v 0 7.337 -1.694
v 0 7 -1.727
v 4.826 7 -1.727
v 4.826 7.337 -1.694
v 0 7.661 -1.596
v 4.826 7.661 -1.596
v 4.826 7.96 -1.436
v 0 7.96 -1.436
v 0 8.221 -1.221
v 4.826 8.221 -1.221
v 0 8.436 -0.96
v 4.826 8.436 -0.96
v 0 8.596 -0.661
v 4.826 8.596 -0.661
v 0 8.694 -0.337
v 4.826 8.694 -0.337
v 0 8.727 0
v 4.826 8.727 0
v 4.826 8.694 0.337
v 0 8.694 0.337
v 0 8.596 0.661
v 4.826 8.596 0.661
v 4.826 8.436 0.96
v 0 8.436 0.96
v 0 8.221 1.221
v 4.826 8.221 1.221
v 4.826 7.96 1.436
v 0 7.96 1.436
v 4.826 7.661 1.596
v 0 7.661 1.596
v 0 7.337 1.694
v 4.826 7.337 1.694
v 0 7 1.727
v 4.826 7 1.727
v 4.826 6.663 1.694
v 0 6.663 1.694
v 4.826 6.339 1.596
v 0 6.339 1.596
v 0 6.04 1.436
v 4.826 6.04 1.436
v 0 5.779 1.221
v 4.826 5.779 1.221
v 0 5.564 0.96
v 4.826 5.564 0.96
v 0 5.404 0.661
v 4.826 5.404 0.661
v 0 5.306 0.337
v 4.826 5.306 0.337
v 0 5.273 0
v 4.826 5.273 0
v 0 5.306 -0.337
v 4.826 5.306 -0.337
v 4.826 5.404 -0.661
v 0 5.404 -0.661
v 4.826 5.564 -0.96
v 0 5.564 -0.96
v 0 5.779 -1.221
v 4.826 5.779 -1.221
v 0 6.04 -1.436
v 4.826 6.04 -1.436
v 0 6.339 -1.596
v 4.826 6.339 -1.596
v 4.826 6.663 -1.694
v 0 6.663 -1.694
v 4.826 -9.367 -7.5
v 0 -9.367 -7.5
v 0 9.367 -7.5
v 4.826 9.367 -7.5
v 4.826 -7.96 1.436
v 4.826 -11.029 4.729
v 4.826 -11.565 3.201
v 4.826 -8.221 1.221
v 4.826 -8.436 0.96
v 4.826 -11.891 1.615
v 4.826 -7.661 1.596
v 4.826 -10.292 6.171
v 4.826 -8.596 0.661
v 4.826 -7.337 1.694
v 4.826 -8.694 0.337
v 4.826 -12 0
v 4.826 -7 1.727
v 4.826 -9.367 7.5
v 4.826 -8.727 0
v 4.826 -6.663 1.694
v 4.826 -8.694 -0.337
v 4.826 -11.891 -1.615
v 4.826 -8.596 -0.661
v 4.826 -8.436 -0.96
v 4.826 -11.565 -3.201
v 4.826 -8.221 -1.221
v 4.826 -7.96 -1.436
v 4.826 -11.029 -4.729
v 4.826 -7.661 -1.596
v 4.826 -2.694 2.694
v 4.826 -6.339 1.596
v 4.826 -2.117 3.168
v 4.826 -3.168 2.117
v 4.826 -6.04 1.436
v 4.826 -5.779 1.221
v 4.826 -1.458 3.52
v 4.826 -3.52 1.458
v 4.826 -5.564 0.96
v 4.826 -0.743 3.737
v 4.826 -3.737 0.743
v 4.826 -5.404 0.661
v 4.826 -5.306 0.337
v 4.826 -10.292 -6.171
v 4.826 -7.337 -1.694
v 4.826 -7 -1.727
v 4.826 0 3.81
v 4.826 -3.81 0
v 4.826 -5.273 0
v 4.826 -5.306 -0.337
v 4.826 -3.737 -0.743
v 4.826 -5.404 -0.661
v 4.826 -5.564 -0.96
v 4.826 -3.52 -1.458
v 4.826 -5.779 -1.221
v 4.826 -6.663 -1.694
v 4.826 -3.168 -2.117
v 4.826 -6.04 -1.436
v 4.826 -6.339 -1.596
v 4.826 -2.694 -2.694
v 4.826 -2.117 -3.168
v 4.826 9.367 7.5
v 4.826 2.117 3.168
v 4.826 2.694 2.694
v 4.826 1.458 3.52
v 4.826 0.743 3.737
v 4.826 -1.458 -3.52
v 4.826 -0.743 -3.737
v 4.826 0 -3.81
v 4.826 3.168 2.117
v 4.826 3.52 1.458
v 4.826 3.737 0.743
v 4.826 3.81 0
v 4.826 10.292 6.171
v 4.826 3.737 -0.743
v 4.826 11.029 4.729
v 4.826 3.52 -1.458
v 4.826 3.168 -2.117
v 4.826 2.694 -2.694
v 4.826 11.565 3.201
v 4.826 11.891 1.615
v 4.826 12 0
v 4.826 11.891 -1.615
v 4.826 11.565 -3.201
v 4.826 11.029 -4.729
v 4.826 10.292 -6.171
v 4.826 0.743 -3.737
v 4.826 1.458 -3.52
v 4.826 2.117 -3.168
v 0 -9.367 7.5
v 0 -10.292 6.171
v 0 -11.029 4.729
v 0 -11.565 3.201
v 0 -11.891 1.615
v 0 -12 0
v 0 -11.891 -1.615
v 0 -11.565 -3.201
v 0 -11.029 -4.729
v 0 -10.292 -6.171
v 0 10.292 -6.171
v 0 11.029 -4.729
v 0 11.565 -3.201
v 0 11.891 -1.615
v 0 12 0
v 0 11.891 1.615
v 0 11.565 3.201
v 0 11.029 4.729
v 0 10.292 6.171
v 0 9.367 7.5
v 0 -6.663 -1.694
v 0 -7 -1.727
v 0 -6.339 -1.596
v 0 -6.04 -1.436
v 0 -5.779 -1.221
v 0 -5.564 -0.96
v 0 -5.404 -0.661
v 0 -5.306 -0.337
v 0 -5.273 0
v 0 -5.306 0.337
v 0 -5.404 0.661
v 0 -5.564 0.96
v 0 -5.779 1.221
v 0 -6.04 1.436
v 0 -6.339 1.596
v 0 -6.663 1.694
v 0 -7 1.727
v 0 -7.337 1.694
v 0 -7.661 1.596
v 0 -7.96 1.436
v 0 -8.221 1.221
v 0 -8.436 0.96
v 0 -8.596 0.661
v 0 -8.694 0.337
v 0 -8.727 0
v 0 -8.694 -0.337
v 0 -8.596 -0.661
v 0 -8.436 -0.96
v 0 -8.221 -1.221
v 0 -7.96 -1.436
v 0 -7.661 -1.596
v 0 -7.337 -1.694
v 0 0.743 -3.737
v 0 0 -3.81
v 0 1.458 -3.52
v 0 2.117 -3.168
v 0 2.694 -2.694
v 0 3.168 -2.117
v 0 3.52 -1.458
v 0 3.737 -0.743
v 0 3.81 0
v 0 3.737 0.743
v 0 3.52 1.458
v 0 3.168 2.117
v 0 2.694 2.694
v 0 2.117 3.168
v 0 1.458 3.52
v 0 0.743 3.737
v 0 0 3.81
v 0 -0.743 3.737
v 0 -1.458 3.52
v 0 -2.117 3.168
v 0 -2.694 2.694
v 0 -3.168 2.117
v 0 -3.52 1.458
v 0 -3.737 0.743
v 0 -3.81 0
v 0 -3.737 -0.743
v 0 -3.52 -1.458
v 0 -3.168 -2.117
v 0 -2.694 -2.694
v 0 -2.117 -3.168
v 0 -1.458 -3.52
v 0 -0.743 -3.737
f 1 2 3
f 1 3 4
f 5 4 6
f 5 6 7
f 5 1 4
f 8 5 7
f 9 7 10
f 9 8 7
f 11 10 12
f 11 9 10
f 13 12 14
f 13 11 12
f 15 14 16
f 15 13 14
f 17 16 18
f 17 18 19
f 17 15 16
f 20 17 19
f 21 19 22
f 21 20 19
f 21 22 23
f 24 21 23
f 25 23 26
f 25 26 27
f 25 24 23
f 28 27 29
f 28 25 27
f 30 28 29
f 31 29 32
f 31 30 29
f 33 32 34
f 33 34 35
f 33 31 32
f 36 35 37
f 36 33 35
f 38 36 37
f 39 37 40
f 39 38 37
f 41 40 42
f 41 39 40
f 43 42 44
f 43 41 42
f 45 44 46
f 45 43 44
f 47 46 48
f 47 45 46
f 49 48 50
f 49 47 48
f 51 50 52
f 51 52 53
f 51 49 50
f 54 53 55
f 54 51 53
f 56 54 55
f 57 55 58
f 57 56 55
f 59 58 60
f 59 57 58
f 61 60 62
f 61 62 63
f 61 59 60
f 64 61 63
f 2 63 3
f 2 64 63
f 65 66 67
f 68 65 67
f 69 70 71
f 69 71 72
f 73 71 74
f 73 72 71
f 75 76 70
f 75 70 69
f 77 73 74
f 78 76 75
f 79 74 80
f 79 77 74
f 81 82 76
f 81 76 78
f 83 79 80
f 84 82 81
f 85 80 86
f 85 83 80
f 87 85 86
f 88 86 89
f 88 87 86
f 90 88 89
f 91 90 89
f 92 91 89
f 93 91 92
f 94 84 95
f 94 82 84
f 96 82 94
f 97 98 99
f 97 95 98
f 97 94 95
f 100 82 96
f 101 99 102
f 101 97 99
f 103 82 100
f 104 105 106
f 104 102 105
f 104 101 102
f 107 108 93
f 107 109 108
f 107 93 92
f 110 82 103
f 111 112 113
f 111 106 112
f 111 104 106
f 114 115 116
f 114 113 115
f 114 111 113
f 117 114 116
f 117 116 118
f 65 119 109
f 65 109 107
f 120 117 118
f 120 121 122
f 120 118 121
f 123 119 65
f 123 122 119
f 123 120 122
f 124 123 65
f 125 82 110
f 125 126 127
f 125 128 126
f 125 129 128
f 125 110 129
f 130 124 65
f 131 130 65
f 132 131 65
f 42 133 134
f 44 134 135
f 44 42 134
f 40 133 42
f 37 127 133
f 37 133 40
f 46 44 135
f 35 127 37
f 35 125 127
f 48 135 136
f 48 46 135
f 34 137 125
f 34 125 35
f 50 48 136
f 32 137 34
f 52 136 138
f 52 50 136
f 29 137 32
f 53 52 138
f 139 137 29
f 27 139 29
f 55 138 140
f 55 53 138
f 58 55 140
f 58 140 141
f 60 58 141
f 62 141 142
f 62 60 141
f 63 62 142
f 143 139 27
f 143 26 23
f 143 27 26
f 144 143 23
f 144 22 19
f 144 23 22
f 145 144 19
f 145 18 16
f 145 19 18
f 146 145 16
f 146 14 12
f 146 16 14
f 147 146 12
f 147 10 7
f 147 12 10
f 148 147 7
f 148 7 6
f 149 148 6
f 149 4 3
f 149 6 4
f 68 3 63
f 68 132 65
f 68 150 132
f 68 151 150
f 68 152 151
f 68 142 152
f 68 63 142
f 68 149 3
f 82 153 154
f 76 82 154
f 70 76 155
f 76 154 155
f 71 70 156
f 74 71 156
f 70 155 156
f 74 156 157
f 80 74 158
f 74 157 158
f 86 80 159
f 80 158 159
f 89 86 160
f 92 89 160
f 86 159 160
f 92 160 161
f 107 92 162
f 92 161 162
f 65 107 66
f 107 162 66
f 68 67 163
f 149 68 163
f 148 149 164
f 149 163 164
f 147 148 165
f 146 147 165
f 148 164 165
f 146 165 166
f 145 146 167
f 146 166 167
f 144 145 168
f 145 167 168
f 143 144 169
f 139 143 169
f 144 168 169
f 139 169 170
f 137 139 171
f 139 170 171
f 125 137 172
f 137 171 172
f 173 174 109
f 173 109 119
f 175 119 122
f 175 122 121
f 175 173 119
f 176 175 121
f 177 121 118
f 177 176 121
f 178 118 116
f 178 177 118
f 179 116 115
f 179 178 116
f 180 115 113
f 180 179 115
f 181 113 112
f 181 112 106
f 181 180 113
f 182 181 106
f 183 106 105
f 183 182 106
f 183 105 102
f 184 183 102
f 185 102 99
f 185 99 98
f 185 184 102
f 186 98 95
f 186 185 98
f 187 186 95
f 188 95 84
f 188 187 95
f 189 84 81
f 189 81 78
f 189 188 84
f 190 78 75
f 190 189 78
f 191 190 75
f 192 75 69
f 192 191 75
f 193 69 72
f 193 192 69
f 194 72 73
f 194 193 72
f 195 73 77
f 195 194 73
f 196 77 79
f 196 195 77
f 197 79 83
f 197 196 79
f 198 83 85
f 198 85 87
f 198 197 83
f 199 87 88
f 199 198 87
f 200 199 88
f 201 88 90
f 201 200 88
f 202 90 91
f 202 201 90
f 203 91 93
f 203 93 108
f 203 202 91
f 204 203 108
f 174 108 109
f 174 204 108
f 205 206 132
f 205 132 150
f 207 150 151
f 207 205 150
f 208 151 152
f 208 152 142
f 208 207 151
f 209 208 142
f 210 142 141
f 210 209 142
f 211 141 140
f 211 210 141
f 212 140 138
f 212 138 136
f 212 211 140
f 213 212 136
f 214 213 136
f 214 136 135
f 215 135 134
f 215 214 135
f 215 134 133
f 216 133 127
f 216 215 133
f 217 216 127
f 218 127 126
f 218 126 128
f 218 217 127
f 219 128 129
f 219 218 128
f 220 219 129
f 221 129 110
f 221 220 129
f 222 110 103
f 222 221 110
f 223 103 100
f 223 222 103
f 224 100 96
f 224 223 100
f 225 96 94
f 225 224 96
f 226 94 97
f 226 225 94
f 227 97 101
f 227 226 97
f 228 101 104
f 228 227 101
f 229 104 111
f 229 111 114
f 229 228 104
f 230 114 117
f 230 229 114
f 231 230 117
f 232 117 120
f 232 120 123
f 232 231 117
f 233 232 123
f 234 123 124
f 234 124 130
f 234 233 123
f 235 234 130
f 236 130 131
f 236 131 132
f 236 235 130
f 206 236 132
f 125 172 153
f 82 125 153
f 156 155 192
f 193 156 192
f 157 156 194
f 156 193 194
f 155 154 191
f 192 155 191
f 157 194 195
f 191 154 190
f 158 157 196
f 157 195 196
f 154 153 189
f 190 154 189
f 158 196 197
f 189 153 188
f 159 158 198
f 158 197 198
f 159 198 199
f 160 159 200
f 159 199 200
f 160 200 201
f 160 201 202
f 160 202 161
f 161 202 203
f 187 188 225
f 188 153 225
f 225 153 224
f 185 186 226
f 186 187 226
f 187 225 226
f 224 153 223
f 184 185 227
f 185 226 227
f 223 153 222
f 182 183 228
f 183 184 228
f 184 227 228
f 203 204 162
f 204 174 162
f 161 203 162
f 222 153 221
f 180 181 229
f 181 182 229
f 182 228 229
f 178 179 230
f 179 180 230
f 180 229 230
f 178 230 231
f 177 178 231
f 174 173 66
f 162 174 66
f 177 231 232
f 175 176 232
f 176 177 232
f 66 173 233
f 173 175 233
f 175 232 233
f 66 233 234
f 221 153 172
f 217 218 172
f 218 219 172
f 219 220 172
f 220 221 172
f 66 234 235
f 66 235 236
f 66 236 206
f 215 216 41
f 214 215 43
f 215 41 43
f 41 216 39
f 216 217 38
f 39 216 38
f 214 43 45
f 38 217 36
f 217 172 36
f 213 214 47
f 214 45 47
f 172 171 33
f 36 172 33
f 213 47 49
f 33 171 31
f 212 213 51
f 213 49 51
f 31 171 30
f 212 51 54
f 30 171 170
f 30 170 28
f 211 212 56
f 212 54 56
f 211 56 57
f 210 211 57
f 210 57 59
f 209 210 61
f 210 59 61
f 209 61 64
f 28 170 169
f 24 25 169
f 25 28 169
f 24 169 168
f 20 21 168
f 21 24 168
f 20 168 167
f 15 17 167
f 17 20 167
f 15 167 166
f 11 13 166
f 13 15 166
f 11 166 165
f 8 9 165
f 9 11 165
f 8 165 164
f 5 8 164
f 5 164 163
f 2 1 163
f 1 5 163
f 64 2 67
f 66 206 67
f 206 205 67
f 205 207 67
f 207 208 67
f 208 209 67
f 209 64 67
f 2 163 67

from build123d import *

# Parameters (mm, degrees)
SKETCH1_R           = 1.7272
SKETCH1_R_2         = 3.81
BOSS_EXTRUDE1_DEPTH = 4.826


with BuildPart() as part:
    # Sketch1 → Boss-Extrude1 (new body)
    with BuildSketch(Plane(origin=(0, 0, 0), x_dir=(0, 0, -1), z_dir=(1, 0, 0))):
        with BuildLine():
            Line((-7.5, 9.367496998), (-7.5, -9.367496998))
            ThreePointArc((-7.5, -9.367496998), (0, -12), (7.5, -9.367496998))
            Line((7.5, -9.367496998), (7.5, 9.367496998))
            ThreePointArc((7.5, 9.367496998), (0, 12), (-7.5, 9.367496998))
        make_face()
        with Locations((0, 7)):
            Circle(SKETCH1_R, mode=Mode.SUBTRACT)
        with Locations((0, -7)):
            Circle(SKETCH1_R, mode=Mode.SUBTRACT)
        Circle(SKETCH1_R_2, mode=Mode.SUBTRACT)
    extrude(amount=BOSS_EXTRUDE1_DEPTH)


solid = part.part
